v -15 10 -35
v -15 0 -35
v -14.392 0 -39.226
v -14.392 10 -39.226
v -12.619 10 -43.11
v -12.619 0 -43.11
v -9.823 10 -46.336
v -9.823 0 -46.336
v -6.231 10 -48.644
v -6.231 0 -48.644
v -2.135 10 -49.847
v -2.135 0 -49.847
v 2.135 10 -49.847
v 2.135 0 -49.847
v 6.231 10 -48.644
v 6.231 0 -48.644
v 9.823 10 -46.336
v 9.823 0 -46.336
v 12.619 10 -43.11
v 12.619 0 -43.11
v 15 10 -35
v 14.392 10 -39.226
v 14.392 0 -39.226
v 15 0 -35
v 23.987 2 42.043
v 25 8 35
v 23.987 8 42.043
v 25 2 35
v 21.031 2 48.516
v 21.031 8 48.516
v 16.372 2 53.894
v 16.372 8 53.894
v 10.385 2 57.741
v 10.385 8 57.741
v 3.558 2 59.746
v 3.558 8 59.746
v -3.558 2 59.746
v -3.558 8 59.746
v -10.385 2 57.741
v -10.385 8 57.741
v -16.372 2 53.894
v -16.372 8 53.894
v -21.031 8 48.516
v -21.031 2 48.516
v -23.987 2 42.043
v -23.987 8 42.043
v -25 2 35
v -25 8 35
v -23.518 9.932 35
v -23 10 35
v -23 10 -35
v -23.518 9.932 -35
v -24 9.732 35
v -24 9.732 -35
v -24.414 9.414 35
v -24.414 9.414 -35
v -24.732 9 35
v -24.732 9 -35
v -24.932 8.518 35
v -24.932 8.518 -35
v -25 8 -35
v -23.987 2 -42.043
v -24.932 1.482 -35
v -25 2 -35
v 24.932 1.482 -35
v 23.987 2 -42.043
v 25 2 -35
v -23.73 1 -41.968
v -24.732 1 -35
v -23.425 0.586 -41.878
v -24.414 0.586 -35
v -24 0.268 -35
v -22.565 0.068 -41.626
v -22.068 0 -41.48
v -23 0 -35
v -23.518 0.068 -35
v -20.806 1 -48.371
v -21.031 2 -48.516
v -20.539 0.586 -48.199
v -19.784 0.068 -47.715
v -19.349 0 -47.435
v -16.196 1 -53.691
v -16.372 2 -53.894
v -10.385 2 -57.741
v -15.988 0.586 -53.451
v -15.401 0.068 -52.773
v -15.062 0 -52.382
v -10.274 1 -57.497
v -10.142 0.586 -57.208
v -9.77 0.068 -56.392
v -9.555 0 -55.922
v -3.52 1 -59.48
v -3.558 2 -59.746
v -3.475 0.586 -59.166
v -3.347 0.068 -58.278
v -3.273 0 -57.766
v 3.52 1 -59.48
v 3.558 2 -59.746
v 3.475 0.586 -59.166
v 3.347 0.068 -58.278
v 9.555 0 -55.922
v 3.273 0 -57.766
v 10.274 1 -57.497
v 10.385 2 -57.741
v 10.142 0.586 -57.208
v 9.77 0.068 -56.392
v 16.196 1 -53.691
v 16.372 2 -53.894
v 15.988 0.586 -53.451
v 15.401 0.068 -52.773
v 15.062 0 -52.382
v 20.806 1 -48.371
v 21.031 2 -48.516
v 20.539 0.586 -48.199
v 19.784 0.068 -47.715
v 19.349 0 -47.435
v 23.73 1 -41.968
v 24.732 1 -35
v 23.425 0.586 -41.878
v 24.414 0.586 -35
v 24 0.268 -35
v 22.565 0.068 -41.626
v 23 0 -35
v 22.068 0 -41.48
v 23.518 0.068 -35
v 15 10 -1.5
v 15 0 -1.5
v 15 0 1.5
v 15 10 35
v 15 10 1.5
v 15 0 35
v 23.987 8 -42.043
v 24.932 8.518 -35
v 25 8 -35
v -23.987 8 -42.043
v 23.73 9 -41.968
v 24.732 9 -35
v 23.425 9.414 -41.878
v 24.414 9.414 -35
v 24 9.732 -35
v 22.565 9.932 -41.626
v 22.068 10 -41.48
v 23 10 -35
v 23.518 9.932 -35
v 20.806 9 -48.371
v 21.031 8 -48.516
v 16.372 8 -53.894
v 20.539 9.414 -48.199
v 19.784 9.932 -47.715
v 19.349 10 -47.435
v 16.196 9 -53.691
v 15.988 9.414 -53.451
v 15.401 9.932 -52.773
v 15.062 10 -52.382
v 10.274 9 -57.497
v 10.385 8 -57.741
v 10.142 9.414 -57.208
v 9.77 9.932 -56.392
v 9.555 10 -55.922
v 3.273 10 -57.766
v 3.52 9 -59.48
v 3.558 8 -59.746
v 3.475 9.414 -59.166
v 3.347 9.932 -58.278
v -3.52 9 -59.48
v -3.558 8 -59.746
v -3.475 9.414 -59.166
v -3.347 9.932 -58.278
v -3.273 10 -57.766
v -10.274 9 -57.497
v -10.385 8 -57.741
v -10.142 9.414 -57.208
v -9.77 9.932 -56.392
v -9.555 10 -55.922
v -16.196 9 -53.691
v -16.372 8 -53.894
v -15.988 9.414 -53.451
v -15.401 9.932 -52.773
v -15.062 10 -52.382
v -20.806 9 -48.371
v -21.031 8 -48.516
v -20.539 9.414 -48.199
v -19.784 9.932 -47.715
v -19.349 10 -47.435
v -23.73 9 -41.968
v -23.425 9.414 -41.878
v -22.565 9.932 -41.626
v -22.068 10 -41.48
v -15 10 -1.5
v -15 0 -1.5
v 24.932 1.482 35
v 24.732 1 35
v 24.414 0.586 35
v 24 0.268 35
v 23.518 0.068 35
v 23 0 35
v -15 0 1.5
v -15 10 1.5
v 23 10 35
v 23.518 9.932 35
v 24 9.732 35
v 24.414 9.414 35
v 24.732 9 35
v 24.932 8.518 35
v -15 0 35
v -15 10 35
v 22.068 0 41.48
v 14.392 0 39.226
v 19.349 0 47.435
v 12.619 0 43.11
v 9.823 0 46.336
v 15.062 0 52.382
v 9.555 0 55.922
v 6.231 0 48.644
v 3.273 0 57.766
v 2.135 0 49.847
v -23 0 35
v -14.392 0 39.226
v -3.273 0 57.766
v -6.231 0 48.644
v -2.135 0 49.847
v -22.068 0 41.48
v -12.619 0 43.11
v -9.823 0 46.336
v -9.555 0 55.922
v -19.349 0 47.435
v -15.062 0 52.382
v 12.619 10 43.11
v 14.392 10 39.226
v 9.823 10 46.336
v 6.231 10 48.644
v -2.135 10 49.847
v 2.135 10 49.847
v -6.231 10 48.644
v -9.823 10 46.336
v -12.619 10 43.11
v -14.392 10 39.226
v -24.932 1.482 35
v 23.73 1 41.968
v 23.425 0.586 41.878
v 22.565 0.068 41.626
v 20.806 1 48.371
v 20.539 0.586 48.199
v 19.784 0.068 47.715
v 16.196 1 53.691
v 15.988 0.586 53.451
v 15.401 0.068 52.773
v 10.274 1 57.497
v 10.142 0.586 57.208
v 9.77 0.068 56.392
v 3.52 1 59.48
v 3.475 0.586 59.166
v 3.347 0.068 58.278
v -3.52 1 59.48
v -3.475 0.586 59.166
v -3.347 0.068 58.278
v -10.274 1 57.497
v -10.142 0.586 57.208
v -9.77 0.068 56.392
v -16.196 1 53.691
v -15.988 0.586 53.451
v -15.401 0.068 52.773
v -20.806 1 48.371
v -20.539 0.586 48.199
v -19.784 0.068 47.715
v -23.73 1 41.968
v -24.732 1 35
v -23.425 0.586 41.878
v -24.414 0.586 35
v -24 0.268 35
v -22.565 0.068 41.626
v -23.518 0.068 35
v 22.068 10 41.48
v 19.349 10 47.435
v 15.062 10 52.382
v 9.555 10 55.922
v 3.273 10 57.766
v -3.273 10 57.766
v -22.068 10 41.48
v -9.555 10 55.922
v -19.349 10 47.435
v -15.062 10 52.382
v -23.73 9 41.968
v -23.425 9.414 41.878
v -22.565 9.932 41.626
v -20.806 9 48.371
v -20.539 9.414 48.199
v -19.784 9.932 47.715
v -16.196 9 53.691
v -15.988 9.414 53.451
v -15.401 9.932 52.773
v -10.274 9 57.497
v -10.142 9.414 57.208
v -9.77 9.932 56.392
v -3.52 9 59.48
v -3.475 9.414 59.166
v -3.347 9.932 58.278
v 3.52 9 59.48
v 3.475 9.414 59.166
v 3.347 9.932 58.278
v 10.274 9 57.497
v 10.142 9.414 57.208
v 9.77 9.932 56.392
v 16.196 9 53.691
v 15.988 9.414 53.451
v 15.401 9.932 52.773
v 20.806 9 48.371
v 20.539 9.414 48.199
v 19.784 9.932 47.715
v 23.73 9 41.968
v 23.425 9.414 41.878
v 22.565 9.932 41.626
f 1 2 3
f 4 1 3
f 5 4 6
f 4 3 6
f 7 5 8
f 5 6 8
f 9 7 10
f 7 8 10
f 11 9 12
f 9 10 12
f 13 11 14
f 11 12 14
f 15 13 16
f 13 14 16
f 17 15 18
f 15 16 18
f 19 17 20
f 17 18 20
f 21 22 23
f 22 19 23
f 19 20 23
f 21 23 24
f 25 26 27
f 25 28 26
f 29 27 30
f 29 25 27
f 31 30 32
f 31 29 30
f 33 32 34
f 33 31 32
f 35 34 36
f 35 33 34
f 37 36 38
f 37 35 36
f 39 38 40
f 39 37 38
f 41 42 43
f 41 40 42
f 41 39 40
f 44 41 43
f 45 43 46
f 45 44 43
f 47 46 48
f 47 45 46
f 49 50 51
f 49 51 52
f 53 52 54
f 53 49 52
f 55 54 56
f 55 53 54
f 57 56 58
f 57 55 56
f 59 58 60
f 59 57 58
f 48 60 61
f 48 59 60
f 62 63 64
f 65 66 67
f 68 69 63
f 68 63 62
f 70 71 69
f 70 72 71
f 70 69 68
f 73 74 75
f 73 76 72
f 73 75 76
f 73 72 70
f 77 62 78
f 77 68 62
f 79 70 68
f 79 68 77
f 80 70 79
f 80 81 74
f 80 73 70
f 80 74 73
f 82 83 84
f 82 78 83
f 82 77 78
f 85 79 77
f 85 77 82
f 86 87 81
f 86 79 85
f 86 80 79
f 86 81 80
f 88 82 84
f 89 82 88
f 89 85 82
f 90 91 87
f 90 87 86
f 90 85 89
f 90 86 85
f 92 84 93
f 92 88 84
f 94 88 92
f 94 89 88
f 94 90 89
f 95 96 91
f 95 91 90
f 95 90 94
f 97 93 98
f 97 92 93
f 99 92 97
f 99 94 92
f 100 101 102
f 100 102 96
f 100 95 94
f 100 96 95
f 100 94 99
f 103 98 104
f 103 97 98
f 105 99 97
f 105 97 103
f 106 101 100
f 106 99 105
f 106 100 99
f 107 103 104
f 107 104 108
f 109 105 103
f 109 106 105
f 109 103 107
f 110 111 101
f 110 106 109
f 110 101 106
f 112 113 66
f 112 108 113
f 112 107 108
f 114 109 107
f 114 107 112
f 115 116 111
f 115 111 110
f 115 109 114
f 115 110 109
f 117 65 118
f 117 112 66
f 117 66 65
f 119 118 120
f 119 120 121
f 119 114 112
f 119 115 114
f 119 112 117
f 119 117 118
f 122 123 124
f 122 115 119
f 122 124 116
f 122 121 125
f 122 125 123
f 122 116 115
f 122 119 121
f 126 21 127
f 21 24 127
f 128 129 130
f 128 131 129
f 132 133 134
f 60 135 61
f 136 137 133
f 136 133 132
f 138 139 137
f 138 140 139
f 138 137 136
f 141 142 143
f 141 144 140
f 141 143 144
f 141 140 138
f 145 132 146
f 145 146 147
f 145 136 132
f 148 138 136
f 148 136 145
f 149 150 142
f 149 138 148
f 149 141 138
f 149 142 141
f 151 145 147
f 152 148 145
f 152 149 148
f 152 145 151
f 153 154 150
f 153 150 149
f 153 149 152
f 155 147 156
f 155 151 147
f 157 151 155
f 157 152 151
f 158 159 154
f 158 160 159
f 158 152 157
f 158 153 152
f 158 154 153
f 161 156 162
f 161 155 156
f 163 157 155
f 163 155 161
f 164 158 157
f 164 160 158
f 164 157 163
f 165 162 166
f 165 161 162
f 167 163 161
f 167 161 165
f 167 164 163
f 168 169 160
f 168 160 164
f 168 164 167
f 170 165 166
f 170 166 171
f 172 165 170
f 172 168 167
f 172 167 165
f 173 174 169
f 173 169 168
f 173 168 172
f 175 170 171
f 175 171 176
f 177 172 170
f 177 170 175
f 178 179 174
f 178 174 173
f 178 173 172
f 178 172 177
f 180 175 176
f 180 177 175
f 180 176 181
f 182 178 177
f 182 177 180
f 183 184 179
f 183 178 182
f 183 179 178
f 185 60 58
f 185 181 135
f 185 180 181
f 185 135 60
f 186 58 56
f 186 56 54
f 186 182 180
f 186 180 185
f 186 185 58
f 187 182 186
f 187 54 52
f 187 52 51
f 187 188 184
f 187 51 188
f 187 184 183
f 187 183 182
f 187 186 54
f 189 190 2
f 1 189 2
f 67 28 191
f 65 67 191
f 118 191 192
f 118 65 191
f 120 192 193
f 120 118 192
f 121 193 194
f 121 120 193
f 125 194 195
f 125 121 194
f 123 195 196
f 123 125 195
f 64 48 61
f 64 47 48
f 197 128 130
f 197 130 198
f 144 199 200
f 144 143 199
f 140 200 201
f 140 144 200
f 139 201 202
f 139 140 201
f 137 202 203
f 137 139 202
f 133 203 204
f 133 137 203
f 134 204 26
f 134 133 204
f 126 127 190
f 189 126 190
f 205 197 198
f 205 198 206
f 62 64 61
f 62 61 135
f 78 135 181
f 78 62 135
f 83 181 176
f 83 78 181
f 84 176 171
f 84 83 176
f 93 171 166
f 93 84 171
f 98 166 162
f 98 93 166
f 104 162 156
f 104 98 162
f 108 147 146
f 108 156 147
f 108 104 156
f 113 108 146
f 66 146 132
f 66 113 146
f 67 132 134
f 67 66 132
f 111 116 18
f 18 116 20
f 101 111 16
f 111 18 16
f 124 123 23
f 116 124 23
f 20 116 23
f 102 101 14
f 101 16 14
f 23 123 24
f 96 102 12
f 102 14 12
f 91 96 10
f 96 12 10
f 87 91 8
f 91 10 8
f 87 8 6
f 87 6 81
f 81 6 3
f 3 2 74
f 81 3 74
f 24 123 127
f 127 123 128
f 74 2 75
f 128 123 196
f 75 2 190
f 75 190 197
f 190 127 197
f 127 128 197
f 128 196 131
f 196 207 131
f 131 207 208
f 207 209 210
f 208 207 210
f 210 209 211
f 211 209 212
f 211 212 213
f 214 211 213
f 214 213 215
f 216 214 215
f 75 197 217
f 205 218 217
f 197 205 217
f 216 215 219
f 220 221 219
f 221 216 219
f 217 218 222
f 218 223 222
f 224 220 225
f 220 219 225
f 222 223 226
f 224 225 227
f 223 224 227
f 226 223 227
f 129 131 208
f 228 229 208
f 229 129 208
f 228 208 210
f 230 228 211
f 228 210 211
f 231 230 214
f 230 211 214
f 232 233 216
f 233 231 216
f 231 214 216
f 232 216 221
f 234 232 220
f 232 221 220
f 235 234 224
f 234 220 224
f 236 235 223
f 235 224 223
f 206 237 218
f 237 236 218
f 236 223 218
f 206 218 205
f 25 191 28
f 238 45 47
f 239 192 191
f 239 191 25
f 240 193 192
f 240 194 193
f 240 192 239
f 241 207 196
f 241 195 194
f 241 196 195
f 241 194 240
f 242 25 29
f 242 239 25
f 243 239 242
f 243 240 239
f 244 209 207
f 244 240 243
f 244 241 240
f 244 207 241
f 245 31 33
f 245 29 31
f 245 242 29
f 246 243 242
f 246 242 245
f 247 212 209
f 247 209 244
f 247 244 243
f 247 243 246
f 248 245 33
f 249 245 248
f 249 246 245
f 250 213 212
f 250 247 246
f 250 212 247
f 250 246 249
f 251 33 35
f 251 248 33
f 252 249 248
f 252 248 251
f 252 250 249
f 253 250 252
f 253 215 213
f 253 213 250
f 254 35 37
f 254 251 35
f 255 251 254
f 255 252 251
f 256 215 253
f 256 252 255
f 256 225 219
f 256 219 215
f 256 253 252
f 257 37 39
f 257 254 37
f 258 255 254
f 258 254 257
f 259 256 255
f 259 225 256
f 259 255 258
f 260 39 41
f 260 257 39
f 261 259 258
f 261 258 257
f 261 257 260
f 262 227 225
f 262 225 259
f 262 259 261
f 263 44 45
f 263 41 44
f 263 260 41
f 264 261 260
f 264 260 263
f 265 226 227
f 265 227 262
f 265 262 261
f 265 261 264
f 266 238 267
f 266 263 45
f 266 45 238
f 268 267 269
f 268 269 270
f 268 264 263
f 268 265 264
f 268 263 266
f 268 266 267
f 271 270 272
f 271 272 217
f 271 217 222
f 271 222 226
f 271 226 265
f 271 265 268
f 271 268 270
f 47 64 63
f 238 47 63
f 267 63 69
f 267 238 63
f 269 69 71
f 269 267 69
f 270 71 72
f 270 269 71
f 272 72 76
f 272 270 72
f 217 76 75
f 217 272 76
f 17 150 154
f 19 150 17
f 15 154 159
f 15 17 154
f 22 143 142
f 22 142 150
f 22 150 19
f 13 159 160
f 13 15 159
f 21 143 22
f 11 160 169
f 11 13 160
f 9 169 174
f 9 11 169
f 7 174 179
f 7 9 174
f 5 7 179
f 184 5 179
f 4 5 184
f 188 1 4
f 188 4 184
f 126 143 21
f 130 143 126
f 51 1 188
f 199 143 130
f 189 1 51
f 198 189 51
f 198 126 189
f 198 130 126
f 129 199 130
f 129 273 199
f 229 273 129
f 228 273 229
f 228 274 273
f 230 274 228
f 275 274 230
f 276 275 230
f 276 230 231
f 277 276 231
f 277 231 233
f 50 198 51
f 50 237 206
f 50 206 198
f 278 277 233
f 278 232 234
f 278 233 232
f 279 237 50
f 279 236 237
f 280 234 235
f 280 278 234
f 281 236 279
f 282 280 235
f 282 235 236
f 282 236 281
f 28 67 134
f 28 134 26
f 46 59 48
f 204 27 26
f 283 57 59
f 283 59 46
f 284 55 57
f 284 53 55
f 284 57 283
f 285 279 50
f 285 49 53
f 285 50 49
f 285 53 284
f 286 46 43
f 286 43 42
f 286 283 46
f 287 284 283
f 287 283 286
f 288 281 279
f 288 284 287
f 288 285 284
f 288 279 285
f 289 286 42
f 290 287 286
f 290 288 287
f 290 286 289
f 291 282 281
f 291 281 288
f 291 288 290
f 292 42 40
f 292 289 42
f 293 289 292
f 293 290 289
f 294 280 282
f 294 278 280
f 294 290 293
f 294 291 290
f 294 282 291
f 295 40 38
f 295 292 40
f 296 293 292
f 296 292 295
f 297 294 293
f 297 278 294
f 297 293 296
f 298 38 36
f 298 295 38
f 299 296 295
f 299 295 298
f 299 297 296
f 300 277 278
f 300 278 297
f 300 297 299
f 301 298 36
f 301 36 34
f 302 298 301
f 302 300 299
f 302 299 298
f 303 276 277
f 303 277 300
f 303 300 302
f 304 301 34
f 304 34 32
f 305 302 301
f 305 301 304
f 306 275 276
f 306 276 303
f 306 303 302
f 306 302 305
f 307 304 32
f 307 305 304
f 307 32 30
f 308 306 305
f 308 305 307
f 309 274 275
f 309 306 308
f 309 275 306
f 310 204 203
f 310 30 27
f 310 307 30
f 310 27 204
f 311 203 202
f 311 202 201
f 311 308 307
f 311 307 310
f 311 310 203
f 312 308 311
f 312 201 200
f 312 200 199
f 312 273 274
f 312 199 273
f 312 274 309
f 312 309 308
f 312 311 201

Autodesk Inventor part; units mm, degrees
ref_plane "YZ Plane" through (0, 0, 0) normal (1, 0, 0) x (0, 1, 0)
ref_plane "XZ Plane" through (0, 0, 0) normal (0, 1, 0) x (-1, 0, 0)
ref_plane "XY Plane" through (0, 0, 0) normal (0, 0, 1) x (1, 0, 0)
sketch "Boceto1" plane through (0, 0, 0) normal (0, 1, 0) x (-1, 0, 0)
  line L0 (0, 35) -> (0, -35) construction
  line L1 (25, 35) -> (25, -35)
  line L2 (-25, -35) -> (-25, 35)
  arc A0 (25, 35) -> (-25, 35) centre (0, 35) ccw
  arc A1 (-25, -35) -> (25, -35) centre (0, -35) ccw
  circle A2 centre (0, -35) radius 15
  circle A3 centre (0, 35) radius 15
  line L3 (0, -20) -> (0, -20)
  line L4 (15, -35) -> (-15, -35)
  line L5 (94.5074, 0) -> (-76.0102, 0) construction
  line L6 (15, 35) -> (-15, 35)
  line L7 (15, -35) -> (-15, -35)
  line L8 (-15, -35) -> (-15, -1.5)
  line L9 (-15, -1.5) -> (15, -1.5)
  line L10 (15, -1.5) -> (15, -35)
  line L11 (-15, 35) -> (-15, 1.5)
  line L12 (-15, 1.5) -> (15, 1.5)
  line L13 (15, 1.5) -> (15, 35)
  point P0 (0, 0)
  point P1 (0, 60)
  point P2 (0, -60)
  point P3 (0, -20)
  point P4 (15, 35)
  point P5 (15, 35)
  dimension "largo" = 120
  dimension "d1" = 50
  dimension "espesor_junta" = 10
  dimension "d3" = 10
  dimension "d6" = 0
  dimension "d9" = 1.5
extrude "Extrusión2" add sketch "Boceto1" along normal blind 10
fillet "Empalme1" radius 2 8 edges at (0, 10, 60) (25, 10, 0) (0, 10, -60) (-25, 10, 0) (0, 0, -60) (-25, 0, 0) (0, 0, 60) (25, 0, 0)
equation "\"d3\" = espesor_junta"
properties part number "mod2" material "Aluminio 6061"
